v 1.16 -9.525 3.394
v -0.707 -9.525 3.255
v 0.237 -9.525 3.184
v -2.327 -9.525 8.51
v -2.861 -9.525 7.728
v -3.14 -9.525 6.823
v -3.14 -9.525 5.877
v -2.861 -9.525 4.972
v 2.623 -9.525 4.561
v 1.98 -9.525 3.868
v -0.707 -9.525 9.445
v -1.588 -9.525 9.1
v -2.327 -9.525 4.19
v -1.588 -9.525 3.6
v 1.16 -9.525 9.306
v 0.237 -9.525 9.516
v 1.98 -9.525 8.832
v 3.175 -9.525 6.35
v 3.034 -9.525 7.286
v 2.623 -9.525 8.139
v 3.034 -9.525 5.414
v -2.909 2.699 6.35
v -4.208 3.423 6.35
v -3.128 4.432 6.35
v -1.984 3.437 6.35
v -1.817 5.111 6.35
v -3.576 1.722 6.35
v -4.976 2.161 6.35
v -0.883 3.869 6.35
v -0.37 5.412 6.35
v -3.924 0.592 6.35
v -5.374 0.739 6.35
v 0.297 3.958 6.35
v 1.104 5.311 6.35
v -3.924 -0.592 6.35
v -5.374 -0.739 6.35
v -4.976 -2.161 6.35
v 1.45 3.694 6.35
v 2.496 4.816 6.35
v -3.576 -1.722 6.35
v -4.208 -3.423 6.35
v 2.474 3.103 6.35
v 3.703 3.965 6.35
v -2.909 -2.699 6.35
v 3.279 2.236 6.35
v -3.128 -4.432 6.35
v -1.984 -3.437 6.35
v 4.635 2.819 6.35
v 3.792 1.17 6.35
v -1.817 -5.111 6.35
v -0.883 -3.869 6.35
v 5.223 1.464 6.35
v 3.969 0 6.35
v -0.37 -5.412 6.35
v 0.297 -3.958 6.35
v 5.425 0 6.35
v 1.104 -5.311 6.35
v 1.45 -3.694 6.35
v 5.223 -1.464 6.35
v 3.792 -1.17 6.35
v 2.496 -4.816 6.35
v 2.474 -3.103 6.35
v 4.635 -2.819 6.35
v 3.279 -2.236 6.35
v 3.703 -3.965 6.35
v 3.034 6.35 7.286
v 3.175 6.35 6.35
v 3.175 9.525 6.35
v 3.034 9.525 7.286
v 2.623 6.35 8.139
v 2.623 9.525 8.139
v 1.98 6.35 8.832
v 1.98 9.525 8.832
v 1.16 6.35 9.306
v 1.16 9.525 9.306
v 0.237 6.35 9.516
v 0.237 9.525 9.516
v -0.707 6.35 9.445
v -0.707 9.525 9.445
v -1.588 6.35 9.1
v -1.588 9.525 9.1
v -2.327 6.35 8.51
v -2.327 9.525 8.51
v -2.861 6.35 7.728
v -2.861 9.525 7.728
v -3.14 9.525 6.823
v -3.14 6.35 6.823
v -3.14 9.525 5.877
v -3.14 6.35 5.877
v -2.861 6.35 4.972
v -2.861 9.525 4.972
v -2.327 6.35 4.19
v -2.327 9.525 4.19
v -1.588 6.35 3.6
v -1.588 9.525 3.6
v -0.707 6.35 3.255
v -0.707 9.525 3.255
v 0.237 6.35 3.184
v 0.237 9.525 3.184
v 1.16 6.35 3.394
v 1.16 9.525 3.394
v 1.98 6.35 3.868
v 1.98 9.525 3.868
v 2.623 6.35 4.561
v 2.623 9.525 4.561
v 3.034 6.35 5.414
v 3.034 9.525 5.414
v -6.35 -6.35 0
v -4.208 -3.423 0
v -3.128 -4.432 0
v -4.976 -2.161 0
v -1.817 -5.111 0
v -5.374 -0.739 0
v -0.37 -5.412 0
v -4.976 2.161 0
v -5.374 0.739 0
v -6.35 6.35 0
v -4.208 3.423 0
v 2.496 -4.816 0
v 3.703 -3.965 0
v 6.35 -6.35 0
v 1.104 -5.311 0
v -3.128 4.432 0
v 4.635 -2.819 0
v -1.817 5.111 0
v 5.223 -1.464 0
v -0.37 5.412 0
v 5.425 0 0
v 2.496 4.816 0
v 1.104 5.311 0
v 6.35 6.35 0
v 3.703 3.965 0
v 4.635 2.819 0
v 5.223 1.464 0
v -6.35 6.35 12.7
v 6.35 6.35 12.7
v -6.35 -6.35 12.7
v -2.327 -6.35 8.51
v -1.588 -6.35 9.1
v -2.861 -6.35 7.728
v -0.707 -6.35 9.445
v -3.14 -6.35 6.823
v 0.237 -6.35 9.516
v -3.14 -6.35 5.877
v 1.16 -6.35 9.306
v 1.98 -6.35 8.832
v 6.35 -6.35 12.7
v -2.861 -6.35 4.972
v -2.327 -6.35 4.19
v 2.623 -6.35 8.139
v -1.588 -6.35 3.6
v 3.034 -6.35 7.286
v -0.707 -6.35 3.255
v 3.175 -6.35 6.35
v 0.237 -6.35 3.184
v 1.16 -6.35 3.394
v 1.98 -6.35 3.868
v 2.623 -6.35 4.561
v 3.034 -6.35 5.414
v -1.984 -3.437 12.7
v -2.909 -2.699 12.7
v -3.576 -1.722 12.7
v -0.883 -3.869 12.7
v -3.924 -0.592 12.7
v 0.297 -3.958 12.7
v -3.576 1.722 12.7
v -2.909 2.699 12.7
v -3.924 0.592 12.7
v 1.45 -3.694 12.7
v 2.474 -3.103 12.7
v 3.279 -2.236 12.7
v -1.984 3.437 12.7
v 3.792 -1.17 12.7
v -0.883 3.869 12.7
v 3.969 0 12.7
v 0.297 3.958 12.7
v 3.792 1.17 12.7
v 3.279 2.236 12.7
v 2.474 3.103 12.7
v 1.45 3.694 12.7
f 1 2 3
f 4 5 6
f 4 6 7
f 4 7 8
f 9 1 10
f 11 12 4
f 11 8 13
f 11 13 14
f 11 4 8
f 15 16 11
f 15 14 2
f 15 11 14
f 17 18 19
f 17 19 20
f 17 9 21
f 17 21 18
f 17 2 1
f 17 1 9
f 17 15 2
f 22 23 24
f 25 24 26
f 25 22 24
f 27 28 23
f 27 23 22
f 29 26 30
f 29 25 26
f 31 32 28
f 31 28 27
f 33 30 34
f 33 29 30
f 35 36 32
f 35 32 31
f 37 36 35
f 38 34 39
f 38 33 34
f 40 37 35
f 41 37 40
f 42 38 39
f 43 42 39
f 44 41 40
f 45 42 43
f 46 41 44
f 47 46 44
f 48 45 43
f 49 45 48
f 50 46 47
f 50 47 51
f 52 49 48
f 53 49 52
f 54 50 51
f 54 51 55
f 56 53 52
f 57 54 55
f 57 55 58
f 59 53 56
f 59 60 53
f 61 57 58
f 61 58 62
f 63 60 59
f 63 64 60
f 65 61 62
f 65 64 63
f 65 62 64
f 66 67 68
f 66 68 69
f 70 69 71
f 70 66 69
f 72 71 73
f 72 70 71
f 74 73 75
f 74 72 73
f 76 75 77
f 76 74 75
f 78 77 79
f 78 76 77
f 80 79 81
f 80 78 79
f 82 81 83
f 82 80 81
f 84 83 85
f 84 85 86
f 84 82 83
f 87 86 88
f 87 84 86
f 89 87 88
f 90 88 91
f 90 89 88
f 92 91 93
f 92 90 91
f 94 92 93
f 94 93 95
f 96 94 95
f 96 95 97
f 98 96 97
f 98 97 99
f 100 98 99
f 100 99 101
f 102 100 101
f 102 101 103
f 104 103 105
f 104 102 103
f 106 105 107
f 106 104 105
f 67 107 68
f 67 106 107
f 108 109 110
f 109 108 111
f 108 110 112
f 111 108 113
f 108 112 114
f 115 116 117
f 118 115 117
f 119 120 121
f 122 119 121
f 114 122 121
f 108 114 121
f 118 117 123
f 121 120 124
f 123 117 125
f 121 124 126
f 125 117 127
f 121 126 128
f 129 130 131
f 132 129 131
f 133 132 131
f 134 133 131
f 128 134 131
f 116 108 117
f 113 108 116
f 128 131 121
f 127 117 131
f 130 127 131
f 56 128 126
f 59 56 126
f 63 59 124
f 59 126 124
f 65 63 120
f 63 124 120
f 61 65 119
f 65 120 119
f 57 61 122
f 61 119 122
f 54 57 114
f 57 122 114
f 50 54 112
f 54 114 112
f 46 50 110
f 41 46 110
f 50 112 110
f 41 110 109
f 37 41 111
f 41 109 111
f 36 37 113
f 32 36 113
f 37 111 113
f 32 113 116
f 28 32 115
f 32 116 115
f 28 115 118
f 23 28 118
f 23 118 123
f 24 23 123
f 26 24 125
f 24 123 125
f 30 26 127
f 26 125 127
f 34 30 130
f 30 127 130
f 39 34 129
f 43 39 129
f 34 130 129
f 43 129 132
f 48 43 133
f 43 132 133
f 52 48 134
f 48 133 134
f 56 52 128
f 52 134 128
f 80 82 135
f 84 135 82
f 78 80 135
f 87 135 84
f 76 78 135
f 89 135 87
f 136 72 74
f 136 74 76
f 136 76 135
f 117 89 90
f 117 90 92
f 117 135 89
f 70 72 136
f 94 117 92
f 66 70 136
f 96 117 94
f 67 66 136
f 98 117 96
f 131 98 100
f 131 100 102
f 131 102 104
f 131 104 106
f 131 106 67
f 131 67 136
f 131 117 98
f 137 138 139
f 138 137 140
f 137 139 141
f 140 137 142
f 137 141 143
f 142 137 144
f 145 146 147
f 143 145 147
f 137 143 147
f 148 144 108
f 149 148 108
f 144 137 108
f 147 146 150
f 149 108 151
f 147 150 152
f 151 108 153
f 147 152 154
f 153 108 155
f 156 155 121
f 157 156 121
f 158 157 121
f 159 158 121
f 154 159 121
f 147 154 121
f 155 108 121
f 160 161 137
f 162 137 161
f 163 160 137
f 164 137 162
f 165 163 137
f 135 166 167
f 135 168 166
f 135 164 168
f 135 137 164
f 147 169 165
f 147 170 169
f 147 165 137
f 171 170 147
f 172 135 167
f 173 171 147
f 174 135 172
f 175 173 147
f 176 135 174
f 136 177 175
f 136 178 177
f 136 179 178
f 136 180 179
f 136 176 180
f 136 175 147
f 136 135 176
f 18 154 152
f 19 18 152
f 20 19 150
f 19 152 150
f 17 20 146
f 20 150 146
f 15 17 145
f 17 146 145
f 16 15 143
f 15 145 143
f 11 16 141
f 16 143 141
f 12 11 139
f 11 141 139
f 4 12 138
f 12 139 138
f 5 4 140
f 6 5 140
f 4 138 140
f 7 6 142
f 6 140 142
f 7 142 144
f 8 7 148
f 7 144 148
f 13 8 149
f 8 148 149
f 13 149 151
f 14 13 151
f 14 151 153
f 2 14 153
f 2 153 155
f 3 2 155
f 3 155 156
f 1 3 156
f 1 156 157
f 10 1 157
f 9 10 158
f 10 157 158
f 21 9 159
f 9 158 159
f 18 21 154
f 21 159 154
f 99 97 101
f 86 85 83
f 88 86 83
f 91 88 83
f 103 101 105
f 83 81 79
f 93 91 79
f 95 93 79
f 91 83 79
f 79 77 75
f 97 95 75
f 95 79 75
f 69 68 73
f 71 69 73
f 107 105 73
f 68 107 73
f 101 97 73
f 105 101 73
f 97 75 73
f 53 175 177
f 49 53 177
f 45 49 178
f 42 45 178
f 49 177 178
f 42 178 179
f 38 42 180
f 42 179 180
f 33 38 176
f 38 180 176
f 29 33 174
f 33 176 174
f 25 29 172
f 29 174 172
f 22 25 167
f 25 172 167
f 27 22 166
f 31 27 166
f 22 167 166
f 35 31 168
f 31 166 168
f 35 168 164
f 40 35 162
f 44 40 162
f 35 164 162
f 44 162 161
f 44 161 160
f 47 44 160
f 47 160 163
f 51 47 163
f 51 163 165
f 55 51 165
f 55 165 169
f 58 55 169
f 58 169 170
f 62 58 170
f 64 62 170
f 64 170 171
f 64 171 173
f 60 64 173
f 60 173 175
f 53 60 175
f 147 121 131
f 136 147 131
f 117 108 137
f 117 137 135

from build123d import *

# Parameters (mm, degrees)
F0_W     = 12.7
F0_H     = 12.7
F1_DEPTH = 12.7
F2_R     = 3.96875
F3_DEPTH = 12.7
F4_R     = 5.4246105656
F5_DEPTH = 6.35
F6_R     = 3.175
F7_DEPTH = 3.175


# Not quite as in the source:
# - a pattern or mirror of a feature is missing from the dataset's text; its kind, count and spacing are read off the source's solid


with BuildPart() as f1:
    # F0 (on Top) → F1 (new body)
    with BuildSketch(Plane.XY):
        Rectangle(F0_W, F0_H)
    extrude(amount=F1_DEPTH)

    # F2 (on face) → F3 (cut, through all)
    with BuildSketch(Plane.XY.offset(12.7)):
        Circle(F2_R)
    extrude(amount=-F3_DEPTH, mode=Mode.SUBTRACT)

    # F4 (on face) → F5 (cut)
    with BuildSketch(Plane(origin=(0, 0, 0), x_dir=(1, 0, 0), z_dir=(0, 0, -1))):
        Circle(F4_R)
    extrude(amount=-F5_DEPTH, mode=Mode.SUBTRACT)

    # F6 (on face) → F7 (join)
    with BuildSketch(Plane.XZ.offset(6.35)):
        with Locations((0, 6.35)):
            Circle(F6_R)
    f7 = extrude(amount=F7_DEPTH)

    # F7_copies: F7 across plane
    add(f7.mirror(Plane.ZX))


solid = f1.part
